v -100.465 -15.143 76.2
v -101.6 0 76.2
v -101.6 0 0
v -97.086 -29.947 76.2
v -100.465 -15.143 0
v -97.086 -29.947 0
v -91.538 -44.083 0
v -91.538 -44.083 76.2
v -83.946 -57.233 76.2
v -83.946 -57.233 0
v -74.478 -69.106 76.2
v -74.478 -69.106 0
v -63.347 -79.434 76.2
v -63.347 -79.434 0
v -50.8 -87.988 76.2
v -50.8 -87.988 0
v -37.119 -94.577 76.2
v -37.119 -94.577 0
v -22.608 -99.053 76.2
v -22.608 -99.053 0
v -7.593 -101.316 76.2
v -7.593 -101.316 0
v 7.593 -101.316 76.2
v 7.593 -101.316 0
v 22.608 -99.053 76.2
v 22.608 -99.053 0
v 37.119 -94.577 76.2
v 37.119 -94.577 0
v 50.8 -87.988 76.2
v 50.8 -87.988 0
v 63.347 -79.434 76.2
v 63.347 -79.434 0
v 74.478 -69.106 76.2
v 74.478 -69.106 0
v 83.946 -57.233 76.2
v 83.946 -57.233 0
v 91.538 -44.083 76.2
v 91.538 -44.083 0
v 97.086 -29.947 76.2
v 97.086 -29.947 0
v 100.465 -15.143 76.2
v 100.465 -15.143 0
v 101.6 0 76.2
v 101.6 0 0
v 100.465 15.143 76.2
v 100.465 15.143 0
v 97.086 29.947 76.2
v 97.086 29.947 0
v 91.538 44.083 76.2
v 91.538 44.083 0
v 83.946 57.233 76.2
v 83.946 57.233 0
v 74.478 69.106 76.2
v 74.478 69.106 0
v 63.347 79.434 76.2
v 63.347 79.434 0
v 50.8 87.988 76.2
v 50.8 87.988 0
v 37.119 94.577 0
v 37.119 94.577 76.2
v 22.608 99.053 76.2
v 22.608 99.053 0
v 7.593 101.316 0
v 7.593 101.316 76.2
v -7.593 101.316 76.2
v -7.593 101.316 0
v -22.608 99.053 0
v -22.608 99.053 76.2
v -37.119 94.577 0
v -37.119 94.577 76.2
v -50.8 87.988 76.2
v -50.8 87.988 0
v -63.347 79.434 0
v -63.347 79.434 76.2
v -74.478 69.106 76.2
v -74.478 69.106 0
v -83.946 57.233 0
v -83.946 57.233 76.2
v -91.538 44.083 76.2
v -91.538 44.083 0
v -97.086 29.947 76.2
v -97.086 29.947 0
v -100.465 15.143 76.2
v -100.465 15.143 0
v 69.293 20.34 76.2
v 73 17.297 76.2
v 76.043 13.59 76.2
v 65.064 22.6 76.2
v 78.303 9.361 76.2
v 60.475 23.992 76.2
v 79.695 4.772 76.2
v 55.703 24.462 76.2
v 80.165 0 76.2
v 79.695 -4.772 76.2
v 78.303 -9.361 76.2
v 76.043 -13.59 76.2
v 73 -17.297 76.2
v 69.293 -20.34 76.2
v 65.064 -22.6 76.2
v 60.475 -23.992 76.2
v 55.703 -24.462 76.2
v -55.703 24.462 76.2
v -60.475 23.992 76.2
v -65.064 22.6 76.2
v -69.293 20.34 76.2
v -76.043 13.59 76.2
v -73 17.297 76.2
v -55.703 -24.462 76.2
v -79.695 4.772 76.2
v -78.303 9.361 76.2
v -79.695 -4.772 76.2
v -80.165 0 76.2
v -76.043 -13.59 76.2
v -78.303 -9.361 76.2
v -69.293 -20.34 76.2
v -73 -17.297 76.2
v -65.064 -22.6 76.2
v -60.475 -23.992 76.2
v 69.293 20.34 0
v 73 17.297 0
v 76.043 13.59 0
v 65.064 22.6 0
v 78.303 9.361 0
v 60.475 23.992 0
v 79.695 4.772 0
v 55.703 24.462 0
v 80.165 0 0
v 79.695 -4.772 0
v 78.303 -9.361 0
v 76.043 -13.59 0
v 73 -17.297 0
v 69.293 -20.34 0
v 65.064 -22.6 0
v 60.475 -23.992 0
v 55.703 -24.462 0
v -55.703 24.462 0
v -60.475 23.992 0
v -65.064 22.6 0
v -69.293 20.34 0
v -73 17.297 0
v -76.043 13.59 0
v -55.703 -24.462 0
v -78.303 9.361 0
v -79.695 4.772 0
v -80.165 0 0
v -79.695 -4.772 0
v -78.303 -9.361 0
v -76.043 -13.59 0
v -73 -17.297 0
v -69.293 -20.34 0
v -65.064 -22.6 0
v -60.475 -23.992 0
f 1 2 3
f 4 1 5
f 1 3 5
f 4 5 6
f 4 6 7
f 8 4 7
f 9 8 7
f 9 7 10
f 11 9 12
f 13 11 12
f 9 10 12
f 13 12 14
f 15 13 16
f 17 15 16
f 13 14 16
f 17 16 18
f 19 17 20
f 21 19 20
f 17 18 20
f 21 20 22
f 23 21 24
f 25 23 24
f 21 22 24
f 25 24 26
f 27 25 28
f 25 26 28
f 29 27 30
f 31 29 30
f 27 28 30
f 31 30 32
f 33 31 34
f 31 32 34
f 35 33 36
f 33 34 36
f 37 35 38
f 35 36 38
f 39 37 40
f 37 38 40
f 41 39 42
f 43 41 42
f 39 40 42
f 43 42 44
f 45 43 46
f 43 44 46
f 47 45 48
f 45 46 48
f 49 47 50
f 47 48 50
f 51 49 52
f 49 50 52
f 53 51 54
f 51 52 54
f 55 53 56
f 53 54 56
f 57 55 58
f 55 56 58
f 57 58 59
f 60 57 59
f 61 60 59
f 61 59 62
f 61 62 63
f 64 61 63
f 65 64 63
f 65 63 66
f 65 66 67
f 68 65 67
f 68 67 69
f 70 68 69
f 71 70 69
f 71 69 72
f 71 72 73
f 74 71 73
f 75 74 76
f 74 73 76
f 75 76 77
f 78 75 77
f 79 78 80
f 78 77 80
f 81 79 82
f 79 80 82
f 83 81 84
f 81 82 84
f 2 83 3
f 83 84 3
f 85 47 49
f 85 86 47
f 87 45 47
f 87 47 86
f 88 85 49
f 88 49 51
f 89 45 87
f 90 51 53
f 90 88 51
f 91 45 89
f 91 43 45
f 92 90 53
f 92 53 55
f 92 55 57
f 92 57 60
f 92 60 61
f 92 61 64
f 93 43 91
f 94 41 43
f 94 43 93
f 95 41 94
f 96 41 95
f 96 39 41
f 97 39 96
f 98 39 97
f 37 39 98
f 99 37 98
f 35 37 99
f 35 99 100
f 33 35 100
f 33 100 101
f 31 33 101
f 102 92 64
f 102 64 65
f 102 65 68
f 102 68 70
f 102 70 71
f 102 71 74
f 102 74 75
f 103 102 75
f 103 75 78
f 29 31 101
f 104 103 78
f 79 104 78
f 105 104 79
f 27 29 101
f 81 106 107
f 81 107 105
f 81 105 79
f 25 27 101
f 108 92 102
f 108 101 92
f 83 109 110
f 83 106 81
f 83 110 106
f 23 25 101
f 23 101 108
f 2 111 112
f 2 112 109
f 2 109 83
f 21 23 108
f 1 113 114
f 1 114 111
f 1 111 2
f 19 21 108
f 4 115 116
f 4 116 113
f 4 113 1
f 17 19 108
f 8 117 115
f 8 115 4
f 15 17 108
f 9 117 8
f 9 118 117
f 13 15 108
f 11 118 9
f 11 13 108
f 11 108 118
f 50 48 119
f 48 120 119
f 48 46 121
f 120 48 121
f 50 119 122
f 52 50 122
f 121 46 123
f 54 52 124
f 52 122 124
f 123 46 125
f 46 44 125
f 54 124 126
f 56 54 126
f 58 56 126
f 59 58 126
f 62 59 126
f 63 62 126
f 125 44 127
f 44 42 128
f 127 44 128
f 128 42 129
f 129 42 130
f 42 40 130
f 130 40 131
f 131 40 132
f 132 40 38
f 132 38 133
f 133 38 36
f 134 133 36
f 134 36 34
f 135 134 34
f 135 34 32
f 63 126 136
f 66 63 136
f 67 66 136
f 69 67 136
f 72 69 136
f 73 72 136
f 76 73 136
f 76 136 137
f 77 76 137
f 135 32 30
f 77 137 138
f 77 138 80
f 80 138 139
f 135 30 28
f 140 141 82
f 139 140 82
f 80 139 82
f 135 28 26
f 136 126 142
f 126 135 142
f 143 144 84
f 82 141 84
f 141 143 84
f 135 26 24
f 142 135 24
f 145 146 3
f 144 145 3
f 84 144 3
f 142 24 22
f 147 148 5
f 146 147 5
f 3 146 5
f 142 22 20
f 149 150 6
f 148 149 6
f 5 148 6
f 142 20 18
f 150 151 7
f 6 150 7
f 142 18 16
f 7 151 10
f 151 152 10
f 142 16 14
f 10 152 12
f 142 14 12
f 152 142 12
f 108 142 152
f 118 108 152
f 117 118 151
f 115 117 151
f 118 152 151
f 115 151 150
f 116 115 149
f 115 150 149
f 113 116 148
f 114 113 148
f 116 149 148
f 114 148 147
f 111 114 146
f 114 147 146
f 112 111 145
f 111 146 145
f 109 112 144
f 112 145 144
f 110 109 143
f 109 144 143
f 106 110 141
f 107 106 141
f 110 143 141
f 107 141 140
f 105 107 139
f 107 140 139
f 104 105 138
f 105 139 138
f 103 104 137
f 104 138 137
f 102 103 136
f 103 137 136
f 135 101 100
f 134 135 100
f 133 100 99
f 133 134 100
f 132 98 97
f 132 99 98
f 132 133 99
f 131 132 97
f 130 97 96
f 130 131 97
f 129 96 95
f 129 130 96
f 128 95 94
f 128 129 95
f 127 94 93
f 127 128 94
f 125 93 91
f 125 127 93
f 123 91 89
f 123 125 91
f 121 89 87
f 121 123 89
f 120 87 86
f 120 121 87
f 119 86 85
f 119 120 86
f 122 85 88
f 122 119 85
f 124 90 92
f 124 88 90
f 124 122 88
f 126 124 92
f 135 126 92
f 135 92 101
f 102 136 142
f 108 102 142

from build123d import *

# Parameters (mm, degrees)
SKETCH1_R               = 101.6
BOSS_EXTRUDE1_DEPTH     = 76.2
CUT_EXTRUDE7_DEPTH      = 163.639355631
CUT_EXTRUDE7_DEPTH_BACK = 163.639355631


with BuildPart() as part:
    # Sketch1 → Boss-Extrude1 (new body)
    with BuildSketch(Plane.XY):
        with Locations(Location((0, 0, 0), (0, 0, 180))):
            Circle(SKETCH1_R)
    extrude(amount=BOSS_EXTRUDE1_DEPTH)

    # Sketch2 → Cut-Extrude7 (cut, two sides: drawn at the far end of the back side and taken through both)
    with BuildSketch(Plane.XY.offset(76.2).offset(-CUT_EXTRUDE7_DEPTH_BACK)):
        with BuildLine():
            ThreePointArc((-55.703026842, -24.462175809), (-80.165202651, 0), (-55.703026842, 24.462175809))
            Line((-55.703026842, 24.462175809), (-55.703026842, -24.462175809))
        make_face()
        with BuildLine():
            Line((55.703026842, 24.462175809), (55.703026842, -24.462175809))
            ThreePointArc((55.703026842, -24.462175809), (80.165202651, 0), (55.703026842, 24.462175809))
        make_face()
    extrude(amount=CUT_EXTRUDE7_DEPTH + CUT_EXTRUDE7_DEPTH_BACK, mode=Mode.SUBTRACT)


solid = part.part
